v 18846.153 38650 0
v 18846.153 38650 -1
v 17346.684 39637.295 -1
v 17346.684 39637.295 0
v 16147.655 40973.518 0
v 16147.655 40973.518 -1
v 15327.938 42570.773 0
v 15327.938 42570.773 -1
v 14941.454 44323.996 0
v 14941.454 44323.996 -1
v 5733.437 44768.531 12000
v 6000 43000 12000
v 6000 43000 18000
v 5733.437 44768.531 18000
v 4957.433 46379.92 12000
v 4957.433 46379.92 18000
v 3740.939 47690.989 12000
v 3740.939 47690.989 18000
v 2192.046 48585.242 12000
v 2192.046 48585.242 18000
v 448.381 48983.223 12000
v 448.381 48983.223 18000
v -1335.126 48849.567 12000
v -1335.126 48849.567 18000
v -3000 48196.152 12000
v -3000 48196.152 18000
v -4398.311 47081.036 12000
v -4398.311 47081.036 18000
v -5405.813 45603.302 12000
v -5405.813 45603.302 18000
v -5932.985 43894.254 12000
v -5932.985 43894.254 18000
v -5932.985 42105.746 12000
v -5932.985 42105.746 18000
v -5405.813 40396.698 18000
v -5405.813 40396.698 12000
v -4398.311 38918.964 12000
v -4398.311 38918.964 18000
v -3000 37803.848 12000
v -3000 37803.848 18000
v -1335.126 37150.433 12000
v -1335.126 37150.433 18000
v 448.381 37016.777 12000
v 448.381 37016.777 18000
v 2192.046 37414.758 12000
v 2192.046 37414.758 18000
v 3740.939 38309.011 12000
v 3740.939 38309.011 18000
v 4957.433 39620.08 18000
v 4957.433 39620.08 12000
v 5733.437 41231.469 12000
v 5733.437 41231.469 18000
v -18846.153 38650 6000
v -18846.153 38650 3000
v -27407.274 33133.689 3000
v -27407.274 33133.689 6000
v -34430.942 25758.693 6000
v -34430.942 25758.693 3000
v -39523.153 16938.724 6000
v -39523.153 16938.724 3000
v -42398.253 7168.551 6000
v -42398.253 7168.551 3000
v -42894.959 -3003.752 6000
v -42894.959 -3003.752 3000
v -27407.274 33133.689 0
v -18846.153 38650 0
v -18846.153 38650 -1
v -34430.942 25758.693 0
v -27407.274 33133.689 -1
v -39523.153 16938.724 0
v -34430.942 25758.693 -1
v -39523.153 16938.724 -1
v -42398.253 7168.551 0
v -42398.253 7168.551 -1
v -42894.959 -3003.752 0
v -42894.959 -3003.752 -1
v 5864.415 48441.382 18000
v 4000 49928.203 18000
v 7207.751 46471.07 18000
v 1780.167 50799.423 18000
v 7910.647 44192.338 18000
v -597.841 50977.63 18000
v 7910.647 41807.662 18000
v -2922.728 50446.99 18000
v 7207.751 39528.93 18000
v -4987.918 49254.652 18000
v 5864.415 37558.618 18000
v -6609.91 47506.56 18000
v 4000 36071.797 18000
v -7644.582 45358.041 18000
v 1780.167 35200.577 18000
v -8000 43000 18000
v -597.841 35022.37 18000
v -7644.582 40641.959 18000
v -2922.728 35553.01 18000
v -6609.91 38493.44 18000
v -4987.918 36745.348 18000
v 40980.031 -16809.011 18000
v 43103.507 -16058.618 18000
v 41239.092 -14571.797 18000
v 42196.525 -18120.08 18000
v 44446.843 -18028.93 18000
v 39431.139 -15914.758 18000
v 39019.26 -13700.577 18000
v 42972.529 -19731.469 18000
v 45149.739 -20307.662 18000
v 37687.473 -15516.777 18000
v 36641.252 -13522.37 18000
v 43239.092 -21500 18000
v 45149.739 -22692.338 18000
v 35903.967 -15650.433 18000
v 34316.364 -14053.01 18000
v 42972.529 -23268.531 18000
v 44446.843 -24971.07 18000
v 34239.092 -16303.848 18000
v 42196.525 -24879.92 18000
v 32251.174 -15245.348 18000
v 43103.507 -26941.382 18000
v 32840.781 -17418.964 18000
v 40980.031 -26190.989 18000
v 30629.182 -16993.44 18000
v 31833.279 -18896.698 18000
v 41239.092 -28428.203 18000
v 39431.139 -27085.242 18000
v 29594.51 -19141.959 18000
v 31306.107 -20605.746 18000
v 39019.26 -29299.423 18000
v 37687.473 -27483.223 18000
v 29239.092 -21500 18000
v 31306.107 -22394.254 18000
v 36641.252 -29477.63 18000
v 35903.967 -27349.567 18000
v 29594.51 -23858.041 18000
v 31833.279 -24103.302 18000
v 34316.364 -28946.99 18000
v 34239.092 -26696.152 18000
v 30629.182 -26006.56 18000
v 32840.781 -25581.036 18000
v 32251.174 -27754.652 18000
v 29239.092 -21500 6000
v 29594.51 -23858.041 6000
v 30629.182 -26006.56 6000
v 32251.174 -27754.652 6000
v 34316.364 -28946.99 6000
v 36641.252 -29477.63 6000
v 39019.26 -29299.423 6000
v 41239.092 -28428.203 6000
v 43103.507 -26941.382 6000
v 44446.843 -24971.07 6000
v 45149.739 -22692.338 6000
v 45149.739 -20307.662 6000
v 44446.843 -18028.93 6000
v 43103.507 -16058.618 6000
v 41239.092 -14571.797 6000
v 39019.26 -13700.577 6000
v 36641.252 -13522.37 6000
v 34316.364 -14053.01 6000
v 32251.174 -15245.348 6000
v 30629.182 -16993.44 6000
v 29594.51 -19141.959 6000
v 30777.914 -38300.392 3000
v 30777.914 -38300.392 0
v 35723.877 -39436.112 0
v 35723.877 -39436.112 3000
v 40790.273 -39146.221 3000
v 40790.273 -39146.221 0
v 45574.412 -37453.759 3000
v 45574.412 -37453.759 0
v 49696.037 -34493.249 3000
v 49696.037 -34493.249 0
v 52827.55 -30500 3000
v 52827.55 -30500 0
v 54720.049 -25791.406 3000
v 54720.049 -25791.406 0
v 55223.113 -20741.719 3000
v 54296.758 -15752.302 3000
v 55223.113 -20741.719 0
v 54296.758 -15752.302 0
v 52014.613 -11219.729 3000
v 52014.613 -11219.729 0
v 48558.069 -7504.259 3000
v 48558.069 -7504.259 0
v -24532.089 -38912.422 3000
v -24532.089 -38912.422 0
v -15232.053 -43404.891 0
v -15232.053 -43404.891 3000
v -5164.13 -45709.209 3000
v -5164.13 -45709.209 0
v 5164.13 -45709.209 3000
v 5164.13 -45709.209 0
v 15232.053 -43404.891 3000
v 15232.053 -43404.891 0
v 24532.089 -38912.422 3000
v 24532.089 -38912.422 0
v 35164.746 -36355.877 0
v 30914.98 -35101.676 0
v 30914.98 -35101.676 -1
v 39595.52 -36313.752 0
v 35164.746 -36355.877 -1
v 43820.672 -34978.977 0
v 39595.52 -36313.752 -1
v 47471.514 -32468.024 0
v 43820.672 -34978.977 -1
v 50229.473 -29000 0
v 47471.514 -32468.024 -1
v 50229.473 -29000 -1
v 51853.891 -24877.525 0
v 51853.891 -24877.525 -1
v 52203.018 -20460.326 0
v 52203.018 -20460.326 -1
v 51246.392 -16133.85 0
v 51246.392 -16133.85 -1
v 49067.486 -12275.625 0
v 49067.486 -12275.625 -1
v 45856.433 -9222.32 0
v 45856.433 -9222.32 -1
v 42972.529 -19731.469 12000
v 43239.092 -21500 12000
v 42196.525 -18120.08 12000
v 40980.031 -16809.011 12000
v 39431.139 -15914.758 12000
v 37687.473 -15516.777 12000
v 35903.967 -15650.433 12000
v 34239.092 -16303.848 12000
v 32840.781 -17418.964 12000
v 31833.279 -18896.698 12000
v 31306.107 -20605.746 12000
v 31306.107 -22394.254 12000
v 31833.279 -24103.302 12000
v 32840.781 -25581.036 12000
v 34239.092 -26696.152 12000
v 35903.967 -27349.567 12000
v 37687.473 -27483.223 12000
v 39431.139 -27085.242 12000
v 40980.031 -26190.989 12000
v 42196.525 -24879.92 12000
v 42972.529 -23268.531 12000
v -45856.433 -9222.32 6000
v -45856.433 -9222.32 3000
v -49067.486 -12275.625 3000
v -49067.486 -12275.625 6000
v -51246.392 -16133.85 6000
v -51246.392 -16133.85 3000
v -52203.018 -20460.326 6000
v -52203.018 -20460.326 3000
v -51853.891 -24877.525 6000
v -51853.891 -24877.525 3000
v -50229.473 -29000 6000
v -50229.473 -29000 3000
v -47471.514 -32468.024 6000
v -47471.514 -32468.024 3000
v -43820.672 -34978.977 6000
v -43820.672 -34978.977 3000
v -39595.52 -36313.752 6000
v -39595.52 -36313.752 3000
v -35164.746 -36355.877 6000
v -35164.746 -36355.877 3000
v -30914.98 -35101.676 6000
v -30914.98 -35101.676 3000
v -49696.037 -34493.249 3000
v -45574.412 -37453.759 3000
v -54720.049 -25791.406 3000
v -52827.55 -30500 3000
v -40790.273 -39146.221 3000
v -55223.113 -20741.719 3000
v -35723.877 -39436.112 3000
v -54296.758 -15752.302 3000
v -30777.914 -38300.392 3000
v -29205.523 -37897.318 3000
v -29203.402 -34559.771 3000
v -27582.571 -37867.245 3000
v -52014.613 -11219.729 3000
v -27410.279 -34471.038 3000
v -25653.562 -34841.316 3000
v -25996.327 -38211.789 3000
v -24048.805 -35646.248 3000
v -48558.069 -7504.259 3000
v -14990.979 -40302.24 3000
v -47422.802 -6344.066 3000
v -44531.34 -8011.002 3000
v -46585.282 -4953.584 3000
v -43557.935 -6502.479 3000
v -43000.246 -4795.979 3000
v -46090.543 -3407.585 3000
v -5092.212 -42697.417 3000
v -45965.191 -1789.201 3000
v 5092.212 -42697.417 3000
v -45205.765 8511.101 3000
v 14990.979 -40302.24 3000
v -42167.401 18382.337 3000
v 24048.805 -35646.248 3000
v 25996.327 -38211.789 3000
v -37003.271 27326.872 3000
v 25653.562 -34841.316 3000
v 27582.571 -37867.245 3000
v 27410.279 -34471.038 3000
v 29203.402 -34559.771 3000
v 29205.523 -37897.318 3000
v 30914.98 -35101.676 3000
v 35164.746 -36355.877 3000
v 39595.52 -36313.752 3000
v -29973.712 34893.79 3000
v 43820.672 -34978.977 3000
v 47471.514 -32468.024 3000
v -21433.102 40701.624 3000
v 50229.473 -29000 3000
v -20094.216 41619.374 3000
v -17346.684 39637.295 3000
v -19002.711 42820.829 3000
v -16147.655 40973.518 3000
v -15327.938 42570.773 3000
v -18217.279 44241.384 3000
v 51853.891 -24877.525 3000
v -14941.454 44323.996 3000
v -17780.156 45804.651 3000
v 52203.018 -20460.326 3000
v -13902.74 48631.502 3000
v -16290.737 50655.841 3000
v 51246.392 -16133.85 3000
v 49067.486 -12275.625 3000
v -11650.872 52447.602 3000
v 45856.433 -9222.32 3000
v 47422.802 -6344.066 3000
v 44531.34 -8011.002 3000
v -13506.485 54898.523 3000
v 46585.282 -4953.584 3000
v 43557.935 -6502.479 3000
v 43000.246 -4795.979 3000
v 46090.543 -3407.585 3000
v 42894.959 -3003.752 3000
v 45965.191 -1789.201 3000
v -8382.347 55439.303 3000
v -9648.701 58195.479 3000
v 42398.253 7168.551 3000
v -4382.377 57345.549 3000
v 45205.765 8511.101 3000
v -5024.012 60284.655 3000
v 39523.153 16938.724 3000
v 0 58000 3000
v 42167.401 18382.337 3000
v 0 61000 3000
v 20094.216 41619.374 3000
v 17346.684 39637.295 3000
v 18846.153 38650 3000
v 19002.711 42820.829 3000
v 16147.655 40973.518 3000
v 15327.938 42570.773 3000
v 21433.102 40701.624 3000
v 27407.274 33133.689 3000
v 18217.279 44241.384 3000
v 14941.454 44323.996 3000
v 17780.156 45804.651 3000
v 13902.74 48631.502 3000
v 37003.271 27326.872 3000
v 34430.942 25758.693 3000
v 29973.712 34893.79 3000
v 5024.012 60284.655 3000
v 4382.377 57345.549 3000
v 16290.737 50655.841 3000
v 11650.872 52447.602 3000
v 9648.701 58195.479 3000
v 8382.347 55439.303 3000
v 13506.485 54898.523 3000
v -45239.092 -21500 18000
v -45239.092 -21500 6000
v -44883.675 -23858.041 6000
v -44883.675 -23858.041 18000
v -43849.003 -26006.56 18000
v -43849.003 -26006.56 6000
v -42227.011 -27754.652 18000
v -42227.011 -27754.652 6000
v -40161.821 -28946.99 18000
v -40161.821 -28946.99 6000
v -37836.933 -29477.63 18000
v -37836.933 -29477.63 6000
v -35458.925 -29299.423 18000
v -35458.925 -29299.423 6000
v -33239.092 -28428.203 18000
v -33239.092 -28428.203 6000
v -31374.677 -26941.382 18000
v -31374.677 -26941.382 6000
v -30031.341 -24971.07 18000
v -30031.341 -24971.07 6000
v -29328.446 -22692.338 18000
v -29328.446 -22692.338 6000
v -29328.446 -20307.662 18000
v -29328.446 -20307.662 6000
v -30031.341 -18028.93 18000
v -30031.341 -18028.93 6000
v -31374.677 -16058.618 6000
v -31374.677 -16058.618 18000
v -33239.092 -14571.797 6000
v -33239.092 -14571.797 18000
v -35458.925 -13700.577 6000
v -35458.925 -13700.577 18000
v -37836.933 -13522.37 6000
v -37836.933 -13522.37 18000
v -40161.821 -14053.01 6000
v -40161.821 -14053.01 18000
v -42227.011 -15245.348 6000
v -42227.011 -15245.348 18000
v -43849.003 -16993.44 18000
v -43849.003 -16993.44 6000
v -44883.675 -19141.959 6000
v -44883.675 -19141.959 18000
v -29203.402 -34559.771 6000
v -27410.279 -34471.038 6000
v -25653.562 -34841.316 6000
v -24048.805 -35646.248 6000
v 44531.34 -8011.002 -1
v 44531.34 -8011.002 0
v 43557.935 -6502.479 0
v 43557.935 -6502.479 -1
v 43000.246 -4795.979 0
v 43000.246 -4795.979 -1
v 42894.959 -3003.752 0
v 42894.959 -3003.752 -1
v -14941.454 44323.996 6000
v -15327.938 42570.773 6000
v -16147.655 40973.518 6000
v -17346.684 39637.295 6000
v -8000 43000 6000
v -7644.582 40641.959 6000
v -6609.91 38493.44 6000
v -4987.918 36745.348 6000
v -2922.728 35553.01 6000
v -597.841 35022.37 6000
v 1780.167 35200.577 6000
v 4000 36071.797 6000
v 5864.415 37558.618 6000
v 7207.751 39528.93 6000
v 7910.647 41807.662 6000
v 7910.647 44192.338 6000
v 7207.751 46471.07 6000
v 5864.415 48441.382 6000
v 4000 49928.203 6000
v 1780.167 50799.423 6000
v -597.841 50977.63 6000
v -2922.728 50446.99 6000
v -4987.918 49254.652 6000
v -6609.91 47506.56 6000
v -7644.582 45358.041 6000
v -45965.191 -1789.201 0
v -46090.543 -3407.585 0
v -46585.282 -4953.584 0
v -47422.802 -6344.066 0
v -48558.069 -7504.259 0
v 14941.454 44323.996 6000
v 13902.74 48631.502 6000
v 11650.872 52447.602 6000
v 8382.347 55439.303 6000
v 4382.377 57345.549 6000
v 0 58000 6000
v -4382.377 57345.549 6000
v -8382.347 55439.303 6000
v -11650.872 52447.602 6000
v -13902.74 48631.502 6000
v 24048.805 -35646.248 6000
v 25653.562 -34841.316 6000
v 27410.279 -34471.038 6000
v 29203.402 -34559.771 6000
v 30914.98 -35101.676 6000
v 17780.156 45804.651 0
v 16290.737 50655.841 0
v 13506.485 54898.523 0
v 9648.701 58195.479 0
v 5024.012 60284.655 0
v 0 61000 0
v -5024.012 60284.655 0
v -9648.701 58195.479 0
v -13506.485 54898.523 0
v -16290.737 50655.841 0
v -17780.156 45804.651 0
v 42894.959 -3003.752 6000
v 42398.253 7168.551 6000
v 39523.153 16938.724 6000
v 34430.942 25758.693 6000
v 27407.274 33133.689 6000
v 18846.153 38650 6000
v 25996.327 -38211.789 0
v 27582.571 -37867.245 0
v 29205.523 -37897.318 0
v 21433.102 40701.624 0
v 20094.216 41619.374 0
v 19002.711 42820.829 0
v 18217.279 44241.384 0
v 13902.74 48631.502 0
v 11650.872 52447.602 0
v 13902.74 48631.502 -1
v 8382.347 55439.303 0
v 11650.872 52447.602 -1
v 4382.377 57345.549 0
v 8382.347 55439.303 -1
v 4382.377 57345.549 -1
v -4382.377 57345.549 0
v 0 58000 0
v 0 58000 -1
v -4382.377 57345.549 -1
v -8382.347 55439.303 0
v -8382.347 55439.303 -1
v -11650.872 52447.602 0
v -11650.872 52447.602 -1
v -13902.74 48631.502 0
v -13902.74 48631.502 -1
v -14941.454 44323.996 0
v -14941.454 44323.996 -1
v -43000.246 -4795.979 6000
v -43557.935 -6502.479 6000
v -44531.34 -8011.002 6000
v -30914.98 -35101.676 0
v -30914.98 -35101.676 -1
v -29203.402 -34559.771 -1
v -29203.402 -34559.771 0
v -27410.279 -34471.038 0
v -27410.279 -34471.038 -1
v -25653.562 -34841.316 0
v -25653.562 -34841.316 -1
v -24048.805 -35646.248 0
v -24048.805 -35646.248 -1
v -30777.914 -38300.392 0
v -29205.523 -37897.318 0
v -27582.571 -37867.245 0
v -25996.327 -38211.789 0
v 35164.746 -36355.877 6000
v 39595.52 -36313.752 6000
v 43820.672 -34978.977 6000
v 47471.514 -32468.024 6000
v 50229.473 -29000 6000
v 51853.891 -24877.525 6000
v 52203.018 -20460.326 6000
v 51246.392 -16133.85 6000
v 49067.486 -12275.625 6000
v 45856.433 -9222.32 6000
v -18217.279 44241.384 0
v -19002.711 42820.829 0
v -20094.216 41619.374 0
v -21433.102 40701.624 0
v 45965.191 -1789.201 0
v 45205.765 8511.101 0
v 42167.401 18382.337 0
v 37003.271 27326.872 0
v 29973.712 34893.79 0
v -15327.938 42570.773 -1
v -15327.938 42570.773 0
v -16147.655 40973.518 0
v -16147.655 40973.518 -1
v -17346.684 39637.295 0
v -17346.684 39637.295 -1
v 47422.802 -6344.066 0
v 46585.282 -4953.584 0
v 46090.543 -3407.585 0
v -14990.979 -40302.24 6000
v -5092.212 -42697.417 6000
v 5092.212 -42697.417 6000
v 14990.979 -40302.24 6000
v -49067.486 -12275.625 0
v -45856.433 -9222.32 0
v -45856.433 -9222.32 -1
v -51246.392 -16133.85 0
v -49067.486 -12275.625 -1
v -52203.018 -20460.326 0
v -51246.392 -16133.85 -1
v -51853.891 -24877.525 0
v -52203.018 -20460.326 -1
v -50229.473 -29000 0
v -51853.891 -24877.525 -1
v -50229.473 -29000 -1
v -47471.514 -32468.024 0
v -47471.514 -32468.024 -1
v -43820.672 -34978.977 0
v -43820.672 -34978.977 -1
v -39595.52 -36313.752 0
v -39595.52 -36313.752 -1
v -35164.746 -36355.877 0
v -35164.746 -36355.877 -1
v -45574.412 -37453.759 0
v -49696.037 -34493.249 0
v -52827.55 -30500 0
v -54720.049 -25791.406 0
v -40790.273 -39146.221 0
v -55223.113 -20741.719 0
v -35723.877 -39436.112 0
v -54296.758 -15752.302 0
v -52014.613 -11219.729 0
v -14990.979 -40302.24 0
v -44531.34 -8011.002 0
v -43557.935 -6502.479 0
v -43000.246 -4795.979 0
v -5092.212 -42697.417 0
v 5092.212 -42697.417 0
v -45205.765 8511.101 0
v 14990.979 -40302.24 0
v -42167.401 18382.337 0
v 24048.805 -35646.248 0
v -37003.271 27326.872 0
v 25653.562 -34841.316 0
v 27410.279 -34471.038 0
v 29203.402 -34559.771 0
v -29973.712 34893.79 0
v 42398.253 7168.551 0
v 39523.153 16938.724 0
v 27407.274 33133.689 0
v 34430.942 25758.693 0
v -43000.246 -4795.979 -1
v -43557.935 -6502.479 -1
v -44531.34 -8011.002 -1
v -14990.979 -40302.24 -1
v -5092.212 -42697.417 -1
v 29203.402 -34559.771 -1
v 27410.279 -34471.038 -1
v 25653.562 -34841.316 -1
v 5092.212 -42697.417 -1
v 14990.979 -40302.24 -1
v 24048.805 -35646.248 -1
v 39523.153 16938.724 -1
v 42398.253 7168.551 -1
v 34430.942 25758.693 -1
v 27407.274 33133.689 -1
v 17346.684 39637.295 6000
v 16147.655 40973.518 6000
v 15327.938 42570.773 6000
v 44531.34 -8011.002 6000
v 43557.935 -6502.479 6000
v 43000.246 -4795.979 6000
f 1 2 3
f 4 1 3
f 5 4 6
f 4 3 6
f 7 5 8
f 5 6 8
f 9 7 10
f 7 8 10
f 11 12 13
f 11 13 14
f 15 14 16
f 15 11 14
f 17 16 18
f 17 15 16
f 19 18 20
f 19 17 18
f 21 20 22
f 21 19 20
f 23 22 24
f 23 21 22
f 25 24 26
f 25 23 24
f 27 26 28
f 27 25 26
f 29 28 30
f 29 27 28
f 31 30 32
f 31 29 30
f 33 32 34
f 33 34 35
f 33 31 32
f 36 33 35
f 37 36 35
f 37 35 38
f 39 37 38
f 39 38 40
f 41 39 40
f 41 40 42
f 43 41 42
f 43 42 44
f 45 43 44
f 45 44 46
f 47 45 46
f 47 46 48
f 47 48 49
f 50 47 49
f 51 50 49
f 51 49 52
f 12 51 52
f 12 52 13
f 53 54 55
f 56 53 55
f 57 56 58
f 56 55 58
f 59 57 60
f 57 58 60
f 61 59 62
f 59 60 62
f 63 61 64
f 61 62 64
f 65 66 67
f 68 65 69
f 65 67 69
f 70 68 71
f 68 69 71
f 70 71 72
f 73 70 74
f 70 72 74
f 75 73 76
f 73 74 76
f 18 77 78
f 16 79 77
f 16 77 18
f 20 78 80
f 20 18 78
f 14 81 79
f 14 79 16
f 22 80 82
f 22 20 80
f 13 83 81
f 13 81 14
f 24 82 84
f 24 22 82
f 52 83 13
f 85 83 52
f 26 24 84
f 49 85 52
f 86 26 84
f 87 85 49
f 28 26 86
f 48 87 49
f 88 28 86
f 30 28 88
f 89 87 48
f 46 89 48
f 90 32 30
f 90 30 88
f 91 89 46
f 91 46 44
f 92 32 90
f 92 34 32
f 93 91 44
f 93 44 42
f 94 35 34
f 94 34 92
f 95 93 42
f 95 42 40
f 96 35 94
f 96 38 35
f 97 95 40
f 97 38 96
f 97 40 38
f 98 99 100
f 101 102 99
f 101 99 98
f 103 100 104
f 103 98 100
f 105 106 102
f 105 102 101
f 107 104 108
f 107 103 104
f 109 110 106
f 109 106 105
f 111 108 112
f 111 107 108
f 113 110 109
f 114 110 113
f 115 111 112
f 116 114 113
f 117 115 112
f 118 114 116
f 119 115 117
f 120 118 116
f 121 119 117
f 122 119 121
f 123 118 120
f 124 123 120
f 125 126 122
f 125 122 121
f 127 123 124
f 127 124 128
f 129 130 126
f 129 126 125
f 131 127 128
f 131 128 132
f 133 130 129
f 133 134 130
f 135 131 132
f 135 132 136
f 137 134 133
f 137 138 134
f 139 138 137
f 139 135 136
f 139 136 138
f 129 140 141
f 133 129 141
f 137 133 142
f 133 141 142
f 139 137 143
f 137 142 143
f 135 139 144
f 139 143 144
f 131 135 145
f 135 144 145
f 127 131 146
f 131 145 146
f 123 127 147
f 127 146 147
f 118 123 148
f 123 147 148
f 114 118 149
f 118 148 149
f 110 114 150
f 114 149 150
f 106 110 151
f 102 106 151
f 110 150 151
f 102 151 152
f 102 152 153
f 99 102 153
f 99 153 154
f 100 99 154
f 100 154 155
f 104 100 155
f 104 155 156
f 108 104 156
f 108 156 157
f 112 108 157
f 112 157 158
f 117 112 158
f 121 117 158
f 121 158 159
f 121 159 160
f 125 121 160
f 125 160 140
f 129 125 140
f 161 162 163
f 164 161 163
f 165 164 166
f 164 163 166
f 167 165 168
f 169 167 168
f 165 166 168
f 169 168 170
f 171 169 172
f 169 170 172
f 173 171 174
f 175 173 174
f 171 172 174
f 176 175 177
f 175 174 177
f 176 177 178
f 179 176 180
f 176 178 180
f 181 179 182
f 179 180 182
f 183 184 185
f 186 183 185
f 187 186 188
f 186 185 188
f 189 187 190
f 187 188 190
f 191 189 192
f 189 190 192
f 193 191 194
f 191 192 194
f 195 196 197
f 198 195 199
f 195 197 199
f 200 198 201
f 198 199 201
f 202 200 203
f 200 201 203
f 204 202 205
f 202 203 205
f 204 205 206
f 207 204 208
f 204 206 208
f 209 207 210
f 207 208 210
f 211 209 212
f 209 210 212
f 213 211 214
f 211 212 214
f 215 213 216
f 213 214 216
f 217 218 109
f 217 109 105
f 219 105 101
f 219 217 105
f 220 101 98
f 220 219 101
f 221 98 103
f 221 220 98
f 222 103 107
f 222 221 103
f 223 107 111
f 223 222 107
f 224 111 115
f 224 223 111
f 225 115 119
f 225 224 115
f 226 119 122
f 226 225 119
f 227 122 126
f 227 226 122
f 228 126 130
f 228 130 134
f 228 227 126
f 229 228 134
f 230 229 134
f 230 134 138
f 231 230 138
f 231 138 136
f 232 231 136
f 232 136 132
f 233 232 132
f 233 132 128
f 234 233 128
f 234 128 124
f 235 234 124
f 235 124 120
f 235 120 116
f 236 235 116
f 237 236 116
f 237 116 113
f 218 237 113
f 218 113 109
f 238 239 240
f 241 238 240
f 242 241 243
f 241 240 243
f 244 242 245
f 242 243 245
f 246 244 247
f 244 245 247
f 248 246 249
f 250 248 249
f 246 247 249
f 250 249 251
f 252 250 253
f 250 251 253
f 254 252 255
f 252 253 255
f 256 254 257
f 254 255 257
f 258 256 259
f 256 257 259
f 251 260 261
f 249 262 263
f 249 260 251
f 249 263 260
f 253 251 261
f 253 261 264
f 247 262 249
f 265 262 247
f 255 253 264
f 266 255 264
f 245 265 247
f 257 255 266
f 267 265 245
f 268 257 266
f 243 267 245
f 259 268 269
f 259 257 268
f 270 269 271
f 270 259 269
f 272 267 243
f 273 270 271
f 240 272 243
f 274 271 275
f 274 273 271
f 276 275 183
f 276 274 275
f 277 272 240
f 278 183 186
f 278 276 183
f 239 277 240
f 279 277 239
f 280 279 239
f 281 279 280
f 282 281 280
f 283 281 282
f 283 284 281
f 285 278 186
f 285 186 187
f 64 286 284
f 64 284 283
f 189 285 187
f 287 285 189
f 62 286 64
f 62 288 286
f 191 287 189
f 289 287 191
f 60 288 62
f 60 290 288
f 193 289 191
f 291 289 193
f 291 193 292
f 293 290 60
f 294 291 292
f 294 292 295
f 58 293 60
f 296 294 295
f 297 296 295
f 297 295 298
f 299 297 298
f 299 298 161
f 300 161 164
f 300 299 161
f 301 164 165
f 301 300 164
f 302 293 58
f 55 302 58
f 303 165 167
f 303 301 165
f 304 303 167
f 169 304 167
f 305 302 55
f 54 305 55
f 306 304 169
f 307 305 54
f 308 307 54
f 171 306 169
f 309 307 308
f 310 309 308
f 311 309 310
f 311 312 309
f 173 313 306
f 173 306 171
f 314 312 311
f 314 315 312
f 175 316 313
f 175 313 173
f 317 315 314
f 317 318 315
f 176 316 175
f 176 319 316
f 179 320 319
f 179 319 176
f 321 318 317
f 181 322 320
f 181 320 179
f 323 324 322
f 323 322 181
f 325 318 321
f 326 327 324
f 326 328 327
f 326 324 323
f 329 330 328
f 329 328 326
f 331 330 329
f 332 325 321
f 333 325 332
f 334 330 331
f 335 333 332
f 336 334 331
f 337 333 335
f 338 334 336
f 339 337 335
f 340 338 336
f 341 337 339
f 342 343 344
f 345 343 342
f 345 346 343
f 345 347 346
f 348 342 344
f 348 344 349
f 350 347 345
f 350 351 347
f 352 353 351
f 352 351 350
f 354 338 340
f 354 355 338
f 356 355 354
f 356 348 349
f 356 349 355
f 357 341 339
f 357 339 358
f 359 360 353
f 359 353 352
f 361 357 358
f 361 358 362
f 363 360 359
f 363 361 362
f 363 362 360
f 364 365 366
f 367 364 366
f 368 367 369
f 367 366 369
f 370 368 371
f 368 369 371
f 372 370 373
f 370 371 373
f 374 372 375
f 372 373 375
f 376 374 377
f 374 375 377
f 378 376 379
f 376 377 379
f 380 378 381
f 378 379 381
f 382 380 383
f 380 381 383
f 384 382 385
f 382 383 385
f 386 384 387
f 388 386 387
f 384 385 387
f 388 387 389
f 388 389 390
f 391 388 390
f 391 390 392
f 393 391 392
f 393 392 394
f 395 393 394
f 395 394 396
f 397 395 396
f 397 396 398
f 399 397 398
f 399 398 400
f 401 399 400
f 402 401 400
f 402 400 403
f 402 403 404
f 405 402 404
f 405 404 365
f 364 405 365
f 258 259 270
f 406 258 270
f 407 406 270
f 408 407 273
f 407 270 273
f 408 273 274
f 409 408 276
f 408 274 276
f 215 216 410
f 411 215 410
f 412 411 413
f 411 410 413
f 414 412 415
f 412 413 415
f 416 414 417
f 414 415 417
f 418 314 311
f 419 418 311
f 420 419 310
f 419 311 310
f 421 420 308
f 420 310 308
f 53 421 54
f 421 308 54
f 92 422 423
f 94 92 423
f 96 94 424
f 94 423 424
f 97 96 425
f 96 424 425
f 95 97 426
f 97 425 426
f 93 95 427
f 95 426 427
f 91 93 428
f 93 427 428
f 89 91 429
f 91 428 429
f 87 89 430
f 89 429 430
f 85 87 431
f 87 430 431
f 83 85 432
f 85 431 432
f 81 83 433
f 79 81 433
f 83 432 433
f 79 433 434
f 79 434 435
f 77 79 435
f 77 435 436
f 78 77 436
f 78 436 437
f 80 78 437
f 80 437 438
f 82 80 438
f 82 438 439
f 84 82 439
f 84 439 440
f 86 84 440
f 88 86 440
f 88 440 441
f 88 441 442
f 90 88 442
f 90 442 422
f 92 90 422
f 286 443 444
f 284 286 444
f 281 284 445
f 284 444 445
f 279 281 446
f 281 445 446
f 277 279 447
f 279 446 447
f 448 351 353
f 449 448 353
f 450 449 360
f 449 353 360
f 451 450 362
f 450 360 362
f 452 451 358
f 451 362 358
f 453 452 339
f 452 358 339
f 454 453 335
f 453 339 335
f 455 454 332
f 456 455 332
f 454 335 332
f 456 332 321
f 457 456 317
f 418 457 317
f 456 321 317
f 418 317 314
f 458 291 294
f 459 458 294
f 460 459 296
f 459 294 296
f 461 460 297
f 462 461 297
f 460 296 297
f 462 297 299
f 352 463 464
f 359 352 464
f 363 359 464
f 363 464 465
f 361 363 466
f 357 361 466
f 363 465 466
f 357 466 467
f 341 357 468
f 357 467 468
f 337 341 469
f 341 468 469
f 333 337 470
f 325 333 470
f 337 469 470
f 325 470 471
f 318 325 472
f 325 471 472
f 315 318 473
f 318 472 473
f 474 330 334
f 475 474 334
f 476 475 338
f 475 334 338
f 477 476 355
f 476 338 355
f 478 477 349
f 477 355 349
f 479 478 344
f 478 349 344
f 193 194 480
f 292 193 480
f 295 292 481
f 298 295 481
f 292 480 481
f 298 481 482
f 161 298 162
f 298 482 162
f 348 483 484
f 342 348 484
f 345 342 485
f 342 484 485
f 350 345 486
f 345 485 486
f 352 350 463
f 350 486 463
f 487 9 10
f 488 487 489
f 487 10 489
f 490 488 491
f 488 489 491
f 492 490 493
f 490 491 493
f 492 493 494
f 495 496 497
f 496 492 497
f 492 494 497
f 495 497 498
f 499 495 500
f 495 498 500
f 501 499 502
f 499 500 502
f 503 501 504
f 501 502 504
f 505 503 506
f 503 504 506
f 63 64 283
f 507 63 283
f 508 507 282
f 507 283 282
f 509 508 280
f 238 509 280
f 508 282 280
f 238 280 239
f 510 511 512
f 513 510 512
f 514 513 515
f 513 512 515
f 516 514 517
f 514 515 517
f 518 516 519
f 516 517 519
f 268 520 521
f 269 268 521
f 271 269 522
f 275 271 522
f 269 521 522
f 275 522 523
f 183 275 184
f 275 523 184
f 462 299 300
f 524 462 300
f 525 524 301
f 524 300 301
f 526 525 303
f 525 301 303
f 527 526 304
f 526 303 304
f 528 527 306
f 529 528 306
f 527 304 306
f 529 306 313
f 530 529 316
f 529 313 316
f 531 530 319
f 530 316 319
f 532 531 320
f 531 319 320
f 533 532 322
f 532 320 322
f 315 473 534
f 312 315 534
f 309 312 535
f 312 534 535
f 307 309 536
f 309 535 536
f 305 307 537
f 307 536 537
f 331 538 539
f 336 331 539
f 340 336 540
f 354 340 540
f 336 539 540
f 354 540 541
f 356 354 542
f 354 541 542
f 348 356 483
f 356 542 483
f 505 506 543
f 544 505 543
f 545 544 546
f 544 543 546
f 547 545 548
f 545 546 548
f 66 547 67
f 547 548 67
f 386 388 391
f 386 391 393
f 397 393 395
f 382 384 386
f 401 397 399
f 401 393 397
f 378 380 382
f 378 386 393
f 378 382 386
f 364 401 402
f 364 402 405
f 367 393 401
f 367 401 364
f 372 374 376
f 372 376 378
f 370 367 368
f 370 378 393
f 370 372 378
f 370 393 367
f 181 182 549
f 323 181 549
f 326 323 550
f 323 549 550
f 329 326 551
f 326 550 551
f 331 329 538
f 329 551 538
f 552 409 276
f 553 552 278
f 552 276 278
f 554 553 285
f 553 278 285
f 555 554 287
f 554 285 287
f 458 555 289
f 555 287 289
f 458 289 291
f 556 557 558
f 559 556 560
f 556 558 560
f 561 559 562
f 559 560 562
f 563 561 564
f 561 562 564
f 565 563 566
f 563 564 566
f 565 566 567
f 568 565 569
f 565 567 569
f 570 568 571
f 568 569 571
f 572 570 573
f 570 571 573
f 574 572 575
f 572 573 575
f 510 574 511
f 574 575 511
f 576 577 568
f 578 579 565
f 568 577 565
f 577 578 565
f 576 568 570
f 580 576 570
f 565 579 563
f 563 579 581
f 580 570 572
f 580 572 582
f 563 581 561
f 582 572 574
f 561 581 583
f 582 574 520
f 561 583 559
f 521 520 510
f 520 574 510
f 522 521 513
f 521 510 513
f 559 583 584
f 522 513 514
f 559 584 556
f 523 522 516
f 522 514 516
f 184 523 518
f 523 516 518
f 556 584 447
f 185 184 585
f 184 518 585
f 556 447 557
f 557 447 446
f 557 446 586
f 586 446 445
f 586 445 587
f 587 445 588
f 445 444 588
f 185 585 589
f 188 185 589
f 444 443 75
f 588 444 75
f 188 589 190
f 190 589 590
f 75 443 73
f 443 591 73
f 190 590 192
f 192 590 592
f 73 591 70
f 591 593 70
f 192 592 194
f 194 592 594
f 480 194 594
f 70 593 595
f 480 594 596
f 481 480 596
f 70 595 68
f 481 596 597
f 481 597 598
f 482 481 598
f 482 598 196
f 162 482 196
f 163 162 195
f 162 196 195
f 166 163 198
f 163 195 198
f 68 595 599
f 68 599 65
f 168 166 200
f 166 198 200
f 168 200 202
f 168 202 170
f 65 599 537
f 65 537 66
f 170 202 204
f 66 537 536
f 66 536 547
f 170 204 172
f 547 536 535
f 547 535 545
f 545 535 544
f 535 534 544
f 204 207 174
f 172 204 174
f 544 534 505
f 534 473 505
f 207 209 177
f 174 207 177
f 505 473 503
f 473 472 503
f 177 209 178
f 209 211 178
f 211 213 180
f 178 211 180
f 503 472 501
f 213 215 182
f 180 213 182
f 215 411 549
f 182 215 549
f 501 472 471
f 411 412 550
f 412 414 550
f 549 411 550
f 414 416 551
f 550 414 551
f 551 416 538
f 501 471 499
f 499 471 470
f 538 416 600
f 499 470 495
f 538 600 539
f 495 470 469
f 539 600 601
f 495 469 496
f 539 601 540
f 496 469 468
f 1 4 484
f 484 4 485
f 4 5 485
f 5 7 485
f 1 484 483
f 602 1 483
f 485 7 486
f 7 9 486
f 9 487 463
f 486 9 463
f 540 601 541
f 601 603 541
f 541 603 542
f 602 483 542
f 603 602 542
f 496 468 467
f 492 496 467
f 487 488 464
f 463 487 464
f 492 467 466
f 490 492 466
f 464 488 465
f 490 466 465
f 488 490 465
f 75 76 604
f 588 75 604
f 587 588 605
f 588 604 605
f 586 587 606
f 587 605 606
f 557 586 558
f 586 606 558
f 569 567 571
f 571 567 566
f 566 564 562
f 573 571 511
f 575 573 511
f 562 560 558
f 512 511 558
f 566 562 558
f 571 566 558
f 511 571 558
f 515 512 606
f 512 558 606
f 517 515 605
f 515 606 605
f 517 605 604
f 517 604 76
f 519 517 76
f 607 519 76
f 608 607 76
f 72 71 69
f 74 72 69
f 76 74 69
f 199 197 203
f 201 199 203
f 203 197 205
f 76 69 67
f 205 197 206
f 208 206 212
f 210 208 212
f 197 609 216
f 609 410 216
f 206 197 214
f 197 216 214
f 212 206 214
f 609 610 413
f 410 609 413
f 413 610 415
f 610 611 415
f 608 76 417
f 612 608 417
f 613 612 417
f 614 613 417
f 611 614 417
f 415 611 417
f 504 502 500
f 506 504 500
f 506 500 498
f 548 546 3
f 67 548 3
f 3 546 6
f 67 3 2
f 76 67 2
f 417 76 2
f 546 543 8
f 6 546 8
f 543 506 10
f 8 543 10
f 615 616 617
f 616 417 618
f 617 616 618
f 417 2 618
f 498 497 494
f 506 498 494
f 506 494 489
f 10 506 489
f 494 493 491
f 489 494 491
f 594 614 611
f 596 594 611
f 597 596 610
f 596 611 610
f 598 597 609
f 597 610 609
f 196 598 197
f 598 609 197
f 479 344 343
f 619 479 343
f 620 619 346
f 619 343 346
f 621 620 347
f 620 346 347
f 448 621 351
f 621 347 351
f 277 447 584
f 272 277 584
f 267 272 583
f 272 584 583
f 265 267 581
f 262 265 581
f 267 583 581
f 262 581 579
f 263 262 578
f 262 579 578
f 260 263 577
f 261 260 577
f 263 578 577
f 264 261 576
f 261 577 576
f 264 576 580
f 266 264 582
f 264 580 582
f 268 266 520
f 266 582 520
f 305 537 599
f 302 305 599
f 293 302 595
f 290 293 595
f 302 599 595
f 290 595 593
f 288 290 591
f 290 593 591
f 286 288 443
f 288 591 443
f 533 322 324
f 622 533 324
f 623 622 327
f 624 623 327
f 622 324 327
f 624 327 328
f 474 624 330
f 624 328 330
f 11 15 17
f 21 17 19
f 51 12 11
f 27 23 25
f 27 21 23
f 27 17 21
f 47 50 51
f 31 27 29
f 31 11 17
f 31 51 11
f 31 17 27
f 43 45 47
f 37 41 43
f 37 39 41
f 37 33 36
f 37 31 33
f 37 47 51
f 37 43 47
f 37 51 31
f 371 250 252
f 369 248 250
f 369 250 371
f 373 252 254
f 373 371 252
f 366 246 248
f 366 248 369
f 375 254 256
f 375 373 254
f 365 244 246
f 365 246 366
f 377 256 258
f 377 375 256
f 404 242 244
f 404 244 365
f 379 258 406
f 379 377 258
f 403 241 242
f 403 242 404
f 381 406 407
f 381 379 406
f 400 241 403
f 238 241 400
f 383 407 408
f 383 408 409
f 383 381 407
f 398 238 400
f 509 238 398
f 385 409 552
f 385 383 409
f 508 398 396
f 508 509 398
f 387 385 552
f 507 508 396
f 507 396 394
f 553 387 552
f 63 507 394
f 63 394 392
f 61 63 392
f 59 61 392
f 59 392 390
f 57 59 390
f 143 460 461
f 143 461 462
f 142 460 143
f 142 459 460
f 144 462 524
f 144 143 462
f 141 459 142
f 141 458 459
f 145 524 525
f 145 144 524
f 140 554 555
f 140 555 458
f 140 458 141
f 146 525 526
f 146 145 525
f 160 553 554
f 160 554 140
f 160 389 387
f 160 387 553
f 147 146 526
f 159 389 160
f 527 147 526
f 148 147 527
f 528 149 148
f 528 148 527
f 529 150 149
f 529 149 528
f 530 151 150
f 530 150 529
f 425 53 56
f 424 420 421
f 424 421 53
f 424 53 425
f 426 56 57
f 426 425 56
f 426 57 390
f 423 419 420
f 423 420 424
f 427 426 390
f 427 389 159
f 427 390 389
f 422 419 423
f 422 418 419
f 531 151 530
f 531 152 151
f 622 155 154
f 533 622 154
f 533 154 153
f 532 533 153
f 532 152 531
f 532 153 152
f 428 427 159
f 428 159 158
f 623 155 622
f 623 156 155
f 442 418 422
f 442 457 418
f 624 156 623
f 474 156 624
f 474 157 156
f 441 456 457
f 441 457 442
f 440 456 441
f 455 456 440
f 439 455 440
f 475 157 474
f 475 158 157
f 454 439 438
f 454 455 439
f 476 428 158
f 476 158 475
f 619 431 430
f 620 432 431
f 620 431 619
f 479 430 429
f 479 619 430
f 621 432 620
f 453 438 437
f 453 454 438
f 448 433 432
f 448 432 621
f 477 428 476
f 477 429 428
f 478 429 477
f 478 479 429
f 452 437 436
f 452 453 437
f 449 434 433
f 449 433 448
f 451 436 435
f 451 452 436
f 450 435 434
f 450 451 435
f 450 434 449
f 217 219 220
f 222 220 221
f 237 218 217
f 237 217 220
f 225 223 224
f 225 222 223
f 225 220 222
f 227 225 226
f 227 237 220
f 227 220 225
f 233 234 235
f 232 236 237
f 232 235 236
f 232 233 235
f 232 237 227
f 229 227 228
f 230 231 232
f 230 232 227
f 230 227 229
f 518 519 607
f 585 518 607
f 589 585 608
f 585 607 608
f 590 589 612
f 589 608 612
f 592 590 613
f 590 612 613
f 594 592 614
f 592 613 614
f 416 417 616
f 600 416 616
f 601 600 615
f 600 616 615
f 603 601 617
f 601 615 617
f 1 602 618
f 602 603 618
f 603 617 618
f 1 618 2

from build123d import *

# Parameters (mm, degrees)
BOSS_EXTRUDE5_DEPTH      = 6000
BOSS_EXTRUDE5_DEPTH_BACK = 1
BOSS_EXTRUDE6_DEPTH      = 3000
SKETCH1_10_R             = 6000
BOSS_EXTRUDE8_DEPTH      = 12000
SKETCH1_12_R             = 8000
SKETCH1_12_R_2           = 6000
BOSS_EXTRUDE9_DEPTH      = 18000


with BuildPart() as part:
    # Sketch1 → Boss-Extrude5 (new, two sides: drawn at the far end of the back side and taken through both)
    with BuildSketch(Plane.XY.offset(-BOSS_EXTRUDE5_DEPTH_BACK)):
        with BuildLine():
            ThreePointArc((-18846.153453689, 38650), (-37239.092362731, 21500), (-42894.958583113, -3003.752345485))
            ThreePointArc((-42894.958583113, -3003.752345485), (-43557.93463547, -6502.479183601), (-45856.433127396, -9222.319512806))
            ThreePointArc((-45856.433127396, -9222.319512806), (-50229.473419497, -29000), (-30914.979543605, -35101.676258865))
            ThreePointArc((-30914.979543605, -35101.676258865), (-27410.279478313, -34471.038338899), (-24048.805129424, -35646.247654515))
            ThreePointArc((-24048.805129424, -35646.247654515), (0, -43000), (24048.805129424, -35646.247654515))
            ThreePointArc((24048.805129424, -35646.247654515), (27410.279478313, -34471.038338899), (30914.979543605, -35101.676258865))
            ThreePointArc((30914.979543605, -35101.676258865), (50229.473419497, -29000), (45856.433127396, -9222.319512806))
            ThreePointArc((45856.433127396, -9222.319512806), (43557.93463547, -6502.479183601), (42894.958583113, -3003.752345485))
            ThreePointArc((42894.958583113, -3003.752345485), (37239.092362731, 21500), (18846.153453689, 38650))
            ThreePointArc((18846.153453689, 38650), (16147.655157157, 40973.5175225), (14941.453583792, 44323.99577167))
            ThreePointArc((14941.453583792, 44323.99577167), (0, 58000), (-14941.453583792, 44323.99577167))
            ThreePointArc((-14941.453583792, 44323.99577167), (-16147.655157157, 40973.5175225), (-18846.153453689, 38650))
        make_face()
    extrude(amount=BOSS_EXTRUDE5_DEPTH + BOSS_EXTRUDE5_DEPTH_BACK)

    # Sketch1<7> → Boss-Extrude6 (add)
    with BuildSketch(Plane.XY):
        with BuildLine():
            ThreePointArc((30777.913736812, -38300.39198245), (52827.549630851, -30500), (48558.06930011, -7504.259180341))
            ThreePointArc((48558.06930011, -7504.259180341), (46585.28150192, -4953.584458975), (45965.190727806, -1789.201318021))
            ThreePointArc((45965.190727806, -1789.201318021), (39837.168574084, 23000), (21433.101570013, 40701.623519087))
            ThreePointArc((21433.101570013, 40701.623519087), (19002.710769696, 42820.8294526), (17780.155563297, 45804.651162791))
            ThreePointArc((17780.155563297, 45804.651162791), (0, 61000), (-17780.155563297, 45804.651162791))
            ThreePointArc((-17780.155563297, 45804.651162791), (-19002.710769696, 42820.8294526), (-21433.101570013, 40701.623519087))
            ThreePointArc((-21433.101570013, 40701.623519087), (-39837.168574084, 23000), (-45965.190727806, -1789.201318021))
            ThreePointArc((-45965.190727806, -1789.201318021), (-46585.28150192, -4953.584458975), (-48558.06930011, -7504.259180341))
            ThreePointArc((-48558.06930011, -7504.259180341), (-52827.549630851, -30500), (-30777.913736812, -38300.39198245))
            ThreePointArc((-30777.913736812, -38300.39198245), (-27582.570732224, -37867.244993625), (-24532.089157793, -38912.422201067))
            ThreePointArc((-24532.089157793, -38912.422201067), (0, -46000), (24532.089157793, -38912.422201067))
            ThreePointArc((24532.089157793, -38912.422201067), (27582.570732224, -37867.244993625), (30777.913736812, -38300.39198245))
        make_face()
    extrude(amount=BOSS_EXTRUDE6_DEPTH)

    # Sketch1<10> → Boss-Extrude8 (add)
    with BuildSketch(Plane.XY):
        with Locations((0, 43000)):
            Circle(SKETCH1_10_R)
        with Locations((37239.092362731, -21500)):
            Circle(SKETCH1_10_R)
        with Locations((-37239.092362731, -21500)):
            Circle(SKETCH1_10_R)
    extrude(amount=BOSS_EXTRUDE8_DEPTH)

    # Sketch1<12> → Boss-Extrude9 (add)
    # profile 1 of 3: a face of its own
    with BuildSketch(Plane.XY):
        with Locations((-37239.092362731, -21500)):
            Circle(SKETCH1_12_R)
    # profile 2 of 3: a face of its own
    with BuildSketch(Plane.XY):
        with Locations((0, 43000)):
            Circle(SKETCH1_12_R)
        with Locations((0, 43000)):
            Circle(SKETCH1_12_R_2, mode=Mode.SUBTRACT)
    # profile 3 of 3: a face of its own
    with BuildSketch(Plane.XY):
        with Locations((37239.092362731, -21500)):
            Circle(SKETCH1_12_R)
        with Locations((37239.092362731, -21500)):
            Circle(SKETCH1_12_R_2, mode=Mode.SUBTRACT)
    extrude(amount=BOSS_EXTRUDE9_DEPTH)


solid = part.part
